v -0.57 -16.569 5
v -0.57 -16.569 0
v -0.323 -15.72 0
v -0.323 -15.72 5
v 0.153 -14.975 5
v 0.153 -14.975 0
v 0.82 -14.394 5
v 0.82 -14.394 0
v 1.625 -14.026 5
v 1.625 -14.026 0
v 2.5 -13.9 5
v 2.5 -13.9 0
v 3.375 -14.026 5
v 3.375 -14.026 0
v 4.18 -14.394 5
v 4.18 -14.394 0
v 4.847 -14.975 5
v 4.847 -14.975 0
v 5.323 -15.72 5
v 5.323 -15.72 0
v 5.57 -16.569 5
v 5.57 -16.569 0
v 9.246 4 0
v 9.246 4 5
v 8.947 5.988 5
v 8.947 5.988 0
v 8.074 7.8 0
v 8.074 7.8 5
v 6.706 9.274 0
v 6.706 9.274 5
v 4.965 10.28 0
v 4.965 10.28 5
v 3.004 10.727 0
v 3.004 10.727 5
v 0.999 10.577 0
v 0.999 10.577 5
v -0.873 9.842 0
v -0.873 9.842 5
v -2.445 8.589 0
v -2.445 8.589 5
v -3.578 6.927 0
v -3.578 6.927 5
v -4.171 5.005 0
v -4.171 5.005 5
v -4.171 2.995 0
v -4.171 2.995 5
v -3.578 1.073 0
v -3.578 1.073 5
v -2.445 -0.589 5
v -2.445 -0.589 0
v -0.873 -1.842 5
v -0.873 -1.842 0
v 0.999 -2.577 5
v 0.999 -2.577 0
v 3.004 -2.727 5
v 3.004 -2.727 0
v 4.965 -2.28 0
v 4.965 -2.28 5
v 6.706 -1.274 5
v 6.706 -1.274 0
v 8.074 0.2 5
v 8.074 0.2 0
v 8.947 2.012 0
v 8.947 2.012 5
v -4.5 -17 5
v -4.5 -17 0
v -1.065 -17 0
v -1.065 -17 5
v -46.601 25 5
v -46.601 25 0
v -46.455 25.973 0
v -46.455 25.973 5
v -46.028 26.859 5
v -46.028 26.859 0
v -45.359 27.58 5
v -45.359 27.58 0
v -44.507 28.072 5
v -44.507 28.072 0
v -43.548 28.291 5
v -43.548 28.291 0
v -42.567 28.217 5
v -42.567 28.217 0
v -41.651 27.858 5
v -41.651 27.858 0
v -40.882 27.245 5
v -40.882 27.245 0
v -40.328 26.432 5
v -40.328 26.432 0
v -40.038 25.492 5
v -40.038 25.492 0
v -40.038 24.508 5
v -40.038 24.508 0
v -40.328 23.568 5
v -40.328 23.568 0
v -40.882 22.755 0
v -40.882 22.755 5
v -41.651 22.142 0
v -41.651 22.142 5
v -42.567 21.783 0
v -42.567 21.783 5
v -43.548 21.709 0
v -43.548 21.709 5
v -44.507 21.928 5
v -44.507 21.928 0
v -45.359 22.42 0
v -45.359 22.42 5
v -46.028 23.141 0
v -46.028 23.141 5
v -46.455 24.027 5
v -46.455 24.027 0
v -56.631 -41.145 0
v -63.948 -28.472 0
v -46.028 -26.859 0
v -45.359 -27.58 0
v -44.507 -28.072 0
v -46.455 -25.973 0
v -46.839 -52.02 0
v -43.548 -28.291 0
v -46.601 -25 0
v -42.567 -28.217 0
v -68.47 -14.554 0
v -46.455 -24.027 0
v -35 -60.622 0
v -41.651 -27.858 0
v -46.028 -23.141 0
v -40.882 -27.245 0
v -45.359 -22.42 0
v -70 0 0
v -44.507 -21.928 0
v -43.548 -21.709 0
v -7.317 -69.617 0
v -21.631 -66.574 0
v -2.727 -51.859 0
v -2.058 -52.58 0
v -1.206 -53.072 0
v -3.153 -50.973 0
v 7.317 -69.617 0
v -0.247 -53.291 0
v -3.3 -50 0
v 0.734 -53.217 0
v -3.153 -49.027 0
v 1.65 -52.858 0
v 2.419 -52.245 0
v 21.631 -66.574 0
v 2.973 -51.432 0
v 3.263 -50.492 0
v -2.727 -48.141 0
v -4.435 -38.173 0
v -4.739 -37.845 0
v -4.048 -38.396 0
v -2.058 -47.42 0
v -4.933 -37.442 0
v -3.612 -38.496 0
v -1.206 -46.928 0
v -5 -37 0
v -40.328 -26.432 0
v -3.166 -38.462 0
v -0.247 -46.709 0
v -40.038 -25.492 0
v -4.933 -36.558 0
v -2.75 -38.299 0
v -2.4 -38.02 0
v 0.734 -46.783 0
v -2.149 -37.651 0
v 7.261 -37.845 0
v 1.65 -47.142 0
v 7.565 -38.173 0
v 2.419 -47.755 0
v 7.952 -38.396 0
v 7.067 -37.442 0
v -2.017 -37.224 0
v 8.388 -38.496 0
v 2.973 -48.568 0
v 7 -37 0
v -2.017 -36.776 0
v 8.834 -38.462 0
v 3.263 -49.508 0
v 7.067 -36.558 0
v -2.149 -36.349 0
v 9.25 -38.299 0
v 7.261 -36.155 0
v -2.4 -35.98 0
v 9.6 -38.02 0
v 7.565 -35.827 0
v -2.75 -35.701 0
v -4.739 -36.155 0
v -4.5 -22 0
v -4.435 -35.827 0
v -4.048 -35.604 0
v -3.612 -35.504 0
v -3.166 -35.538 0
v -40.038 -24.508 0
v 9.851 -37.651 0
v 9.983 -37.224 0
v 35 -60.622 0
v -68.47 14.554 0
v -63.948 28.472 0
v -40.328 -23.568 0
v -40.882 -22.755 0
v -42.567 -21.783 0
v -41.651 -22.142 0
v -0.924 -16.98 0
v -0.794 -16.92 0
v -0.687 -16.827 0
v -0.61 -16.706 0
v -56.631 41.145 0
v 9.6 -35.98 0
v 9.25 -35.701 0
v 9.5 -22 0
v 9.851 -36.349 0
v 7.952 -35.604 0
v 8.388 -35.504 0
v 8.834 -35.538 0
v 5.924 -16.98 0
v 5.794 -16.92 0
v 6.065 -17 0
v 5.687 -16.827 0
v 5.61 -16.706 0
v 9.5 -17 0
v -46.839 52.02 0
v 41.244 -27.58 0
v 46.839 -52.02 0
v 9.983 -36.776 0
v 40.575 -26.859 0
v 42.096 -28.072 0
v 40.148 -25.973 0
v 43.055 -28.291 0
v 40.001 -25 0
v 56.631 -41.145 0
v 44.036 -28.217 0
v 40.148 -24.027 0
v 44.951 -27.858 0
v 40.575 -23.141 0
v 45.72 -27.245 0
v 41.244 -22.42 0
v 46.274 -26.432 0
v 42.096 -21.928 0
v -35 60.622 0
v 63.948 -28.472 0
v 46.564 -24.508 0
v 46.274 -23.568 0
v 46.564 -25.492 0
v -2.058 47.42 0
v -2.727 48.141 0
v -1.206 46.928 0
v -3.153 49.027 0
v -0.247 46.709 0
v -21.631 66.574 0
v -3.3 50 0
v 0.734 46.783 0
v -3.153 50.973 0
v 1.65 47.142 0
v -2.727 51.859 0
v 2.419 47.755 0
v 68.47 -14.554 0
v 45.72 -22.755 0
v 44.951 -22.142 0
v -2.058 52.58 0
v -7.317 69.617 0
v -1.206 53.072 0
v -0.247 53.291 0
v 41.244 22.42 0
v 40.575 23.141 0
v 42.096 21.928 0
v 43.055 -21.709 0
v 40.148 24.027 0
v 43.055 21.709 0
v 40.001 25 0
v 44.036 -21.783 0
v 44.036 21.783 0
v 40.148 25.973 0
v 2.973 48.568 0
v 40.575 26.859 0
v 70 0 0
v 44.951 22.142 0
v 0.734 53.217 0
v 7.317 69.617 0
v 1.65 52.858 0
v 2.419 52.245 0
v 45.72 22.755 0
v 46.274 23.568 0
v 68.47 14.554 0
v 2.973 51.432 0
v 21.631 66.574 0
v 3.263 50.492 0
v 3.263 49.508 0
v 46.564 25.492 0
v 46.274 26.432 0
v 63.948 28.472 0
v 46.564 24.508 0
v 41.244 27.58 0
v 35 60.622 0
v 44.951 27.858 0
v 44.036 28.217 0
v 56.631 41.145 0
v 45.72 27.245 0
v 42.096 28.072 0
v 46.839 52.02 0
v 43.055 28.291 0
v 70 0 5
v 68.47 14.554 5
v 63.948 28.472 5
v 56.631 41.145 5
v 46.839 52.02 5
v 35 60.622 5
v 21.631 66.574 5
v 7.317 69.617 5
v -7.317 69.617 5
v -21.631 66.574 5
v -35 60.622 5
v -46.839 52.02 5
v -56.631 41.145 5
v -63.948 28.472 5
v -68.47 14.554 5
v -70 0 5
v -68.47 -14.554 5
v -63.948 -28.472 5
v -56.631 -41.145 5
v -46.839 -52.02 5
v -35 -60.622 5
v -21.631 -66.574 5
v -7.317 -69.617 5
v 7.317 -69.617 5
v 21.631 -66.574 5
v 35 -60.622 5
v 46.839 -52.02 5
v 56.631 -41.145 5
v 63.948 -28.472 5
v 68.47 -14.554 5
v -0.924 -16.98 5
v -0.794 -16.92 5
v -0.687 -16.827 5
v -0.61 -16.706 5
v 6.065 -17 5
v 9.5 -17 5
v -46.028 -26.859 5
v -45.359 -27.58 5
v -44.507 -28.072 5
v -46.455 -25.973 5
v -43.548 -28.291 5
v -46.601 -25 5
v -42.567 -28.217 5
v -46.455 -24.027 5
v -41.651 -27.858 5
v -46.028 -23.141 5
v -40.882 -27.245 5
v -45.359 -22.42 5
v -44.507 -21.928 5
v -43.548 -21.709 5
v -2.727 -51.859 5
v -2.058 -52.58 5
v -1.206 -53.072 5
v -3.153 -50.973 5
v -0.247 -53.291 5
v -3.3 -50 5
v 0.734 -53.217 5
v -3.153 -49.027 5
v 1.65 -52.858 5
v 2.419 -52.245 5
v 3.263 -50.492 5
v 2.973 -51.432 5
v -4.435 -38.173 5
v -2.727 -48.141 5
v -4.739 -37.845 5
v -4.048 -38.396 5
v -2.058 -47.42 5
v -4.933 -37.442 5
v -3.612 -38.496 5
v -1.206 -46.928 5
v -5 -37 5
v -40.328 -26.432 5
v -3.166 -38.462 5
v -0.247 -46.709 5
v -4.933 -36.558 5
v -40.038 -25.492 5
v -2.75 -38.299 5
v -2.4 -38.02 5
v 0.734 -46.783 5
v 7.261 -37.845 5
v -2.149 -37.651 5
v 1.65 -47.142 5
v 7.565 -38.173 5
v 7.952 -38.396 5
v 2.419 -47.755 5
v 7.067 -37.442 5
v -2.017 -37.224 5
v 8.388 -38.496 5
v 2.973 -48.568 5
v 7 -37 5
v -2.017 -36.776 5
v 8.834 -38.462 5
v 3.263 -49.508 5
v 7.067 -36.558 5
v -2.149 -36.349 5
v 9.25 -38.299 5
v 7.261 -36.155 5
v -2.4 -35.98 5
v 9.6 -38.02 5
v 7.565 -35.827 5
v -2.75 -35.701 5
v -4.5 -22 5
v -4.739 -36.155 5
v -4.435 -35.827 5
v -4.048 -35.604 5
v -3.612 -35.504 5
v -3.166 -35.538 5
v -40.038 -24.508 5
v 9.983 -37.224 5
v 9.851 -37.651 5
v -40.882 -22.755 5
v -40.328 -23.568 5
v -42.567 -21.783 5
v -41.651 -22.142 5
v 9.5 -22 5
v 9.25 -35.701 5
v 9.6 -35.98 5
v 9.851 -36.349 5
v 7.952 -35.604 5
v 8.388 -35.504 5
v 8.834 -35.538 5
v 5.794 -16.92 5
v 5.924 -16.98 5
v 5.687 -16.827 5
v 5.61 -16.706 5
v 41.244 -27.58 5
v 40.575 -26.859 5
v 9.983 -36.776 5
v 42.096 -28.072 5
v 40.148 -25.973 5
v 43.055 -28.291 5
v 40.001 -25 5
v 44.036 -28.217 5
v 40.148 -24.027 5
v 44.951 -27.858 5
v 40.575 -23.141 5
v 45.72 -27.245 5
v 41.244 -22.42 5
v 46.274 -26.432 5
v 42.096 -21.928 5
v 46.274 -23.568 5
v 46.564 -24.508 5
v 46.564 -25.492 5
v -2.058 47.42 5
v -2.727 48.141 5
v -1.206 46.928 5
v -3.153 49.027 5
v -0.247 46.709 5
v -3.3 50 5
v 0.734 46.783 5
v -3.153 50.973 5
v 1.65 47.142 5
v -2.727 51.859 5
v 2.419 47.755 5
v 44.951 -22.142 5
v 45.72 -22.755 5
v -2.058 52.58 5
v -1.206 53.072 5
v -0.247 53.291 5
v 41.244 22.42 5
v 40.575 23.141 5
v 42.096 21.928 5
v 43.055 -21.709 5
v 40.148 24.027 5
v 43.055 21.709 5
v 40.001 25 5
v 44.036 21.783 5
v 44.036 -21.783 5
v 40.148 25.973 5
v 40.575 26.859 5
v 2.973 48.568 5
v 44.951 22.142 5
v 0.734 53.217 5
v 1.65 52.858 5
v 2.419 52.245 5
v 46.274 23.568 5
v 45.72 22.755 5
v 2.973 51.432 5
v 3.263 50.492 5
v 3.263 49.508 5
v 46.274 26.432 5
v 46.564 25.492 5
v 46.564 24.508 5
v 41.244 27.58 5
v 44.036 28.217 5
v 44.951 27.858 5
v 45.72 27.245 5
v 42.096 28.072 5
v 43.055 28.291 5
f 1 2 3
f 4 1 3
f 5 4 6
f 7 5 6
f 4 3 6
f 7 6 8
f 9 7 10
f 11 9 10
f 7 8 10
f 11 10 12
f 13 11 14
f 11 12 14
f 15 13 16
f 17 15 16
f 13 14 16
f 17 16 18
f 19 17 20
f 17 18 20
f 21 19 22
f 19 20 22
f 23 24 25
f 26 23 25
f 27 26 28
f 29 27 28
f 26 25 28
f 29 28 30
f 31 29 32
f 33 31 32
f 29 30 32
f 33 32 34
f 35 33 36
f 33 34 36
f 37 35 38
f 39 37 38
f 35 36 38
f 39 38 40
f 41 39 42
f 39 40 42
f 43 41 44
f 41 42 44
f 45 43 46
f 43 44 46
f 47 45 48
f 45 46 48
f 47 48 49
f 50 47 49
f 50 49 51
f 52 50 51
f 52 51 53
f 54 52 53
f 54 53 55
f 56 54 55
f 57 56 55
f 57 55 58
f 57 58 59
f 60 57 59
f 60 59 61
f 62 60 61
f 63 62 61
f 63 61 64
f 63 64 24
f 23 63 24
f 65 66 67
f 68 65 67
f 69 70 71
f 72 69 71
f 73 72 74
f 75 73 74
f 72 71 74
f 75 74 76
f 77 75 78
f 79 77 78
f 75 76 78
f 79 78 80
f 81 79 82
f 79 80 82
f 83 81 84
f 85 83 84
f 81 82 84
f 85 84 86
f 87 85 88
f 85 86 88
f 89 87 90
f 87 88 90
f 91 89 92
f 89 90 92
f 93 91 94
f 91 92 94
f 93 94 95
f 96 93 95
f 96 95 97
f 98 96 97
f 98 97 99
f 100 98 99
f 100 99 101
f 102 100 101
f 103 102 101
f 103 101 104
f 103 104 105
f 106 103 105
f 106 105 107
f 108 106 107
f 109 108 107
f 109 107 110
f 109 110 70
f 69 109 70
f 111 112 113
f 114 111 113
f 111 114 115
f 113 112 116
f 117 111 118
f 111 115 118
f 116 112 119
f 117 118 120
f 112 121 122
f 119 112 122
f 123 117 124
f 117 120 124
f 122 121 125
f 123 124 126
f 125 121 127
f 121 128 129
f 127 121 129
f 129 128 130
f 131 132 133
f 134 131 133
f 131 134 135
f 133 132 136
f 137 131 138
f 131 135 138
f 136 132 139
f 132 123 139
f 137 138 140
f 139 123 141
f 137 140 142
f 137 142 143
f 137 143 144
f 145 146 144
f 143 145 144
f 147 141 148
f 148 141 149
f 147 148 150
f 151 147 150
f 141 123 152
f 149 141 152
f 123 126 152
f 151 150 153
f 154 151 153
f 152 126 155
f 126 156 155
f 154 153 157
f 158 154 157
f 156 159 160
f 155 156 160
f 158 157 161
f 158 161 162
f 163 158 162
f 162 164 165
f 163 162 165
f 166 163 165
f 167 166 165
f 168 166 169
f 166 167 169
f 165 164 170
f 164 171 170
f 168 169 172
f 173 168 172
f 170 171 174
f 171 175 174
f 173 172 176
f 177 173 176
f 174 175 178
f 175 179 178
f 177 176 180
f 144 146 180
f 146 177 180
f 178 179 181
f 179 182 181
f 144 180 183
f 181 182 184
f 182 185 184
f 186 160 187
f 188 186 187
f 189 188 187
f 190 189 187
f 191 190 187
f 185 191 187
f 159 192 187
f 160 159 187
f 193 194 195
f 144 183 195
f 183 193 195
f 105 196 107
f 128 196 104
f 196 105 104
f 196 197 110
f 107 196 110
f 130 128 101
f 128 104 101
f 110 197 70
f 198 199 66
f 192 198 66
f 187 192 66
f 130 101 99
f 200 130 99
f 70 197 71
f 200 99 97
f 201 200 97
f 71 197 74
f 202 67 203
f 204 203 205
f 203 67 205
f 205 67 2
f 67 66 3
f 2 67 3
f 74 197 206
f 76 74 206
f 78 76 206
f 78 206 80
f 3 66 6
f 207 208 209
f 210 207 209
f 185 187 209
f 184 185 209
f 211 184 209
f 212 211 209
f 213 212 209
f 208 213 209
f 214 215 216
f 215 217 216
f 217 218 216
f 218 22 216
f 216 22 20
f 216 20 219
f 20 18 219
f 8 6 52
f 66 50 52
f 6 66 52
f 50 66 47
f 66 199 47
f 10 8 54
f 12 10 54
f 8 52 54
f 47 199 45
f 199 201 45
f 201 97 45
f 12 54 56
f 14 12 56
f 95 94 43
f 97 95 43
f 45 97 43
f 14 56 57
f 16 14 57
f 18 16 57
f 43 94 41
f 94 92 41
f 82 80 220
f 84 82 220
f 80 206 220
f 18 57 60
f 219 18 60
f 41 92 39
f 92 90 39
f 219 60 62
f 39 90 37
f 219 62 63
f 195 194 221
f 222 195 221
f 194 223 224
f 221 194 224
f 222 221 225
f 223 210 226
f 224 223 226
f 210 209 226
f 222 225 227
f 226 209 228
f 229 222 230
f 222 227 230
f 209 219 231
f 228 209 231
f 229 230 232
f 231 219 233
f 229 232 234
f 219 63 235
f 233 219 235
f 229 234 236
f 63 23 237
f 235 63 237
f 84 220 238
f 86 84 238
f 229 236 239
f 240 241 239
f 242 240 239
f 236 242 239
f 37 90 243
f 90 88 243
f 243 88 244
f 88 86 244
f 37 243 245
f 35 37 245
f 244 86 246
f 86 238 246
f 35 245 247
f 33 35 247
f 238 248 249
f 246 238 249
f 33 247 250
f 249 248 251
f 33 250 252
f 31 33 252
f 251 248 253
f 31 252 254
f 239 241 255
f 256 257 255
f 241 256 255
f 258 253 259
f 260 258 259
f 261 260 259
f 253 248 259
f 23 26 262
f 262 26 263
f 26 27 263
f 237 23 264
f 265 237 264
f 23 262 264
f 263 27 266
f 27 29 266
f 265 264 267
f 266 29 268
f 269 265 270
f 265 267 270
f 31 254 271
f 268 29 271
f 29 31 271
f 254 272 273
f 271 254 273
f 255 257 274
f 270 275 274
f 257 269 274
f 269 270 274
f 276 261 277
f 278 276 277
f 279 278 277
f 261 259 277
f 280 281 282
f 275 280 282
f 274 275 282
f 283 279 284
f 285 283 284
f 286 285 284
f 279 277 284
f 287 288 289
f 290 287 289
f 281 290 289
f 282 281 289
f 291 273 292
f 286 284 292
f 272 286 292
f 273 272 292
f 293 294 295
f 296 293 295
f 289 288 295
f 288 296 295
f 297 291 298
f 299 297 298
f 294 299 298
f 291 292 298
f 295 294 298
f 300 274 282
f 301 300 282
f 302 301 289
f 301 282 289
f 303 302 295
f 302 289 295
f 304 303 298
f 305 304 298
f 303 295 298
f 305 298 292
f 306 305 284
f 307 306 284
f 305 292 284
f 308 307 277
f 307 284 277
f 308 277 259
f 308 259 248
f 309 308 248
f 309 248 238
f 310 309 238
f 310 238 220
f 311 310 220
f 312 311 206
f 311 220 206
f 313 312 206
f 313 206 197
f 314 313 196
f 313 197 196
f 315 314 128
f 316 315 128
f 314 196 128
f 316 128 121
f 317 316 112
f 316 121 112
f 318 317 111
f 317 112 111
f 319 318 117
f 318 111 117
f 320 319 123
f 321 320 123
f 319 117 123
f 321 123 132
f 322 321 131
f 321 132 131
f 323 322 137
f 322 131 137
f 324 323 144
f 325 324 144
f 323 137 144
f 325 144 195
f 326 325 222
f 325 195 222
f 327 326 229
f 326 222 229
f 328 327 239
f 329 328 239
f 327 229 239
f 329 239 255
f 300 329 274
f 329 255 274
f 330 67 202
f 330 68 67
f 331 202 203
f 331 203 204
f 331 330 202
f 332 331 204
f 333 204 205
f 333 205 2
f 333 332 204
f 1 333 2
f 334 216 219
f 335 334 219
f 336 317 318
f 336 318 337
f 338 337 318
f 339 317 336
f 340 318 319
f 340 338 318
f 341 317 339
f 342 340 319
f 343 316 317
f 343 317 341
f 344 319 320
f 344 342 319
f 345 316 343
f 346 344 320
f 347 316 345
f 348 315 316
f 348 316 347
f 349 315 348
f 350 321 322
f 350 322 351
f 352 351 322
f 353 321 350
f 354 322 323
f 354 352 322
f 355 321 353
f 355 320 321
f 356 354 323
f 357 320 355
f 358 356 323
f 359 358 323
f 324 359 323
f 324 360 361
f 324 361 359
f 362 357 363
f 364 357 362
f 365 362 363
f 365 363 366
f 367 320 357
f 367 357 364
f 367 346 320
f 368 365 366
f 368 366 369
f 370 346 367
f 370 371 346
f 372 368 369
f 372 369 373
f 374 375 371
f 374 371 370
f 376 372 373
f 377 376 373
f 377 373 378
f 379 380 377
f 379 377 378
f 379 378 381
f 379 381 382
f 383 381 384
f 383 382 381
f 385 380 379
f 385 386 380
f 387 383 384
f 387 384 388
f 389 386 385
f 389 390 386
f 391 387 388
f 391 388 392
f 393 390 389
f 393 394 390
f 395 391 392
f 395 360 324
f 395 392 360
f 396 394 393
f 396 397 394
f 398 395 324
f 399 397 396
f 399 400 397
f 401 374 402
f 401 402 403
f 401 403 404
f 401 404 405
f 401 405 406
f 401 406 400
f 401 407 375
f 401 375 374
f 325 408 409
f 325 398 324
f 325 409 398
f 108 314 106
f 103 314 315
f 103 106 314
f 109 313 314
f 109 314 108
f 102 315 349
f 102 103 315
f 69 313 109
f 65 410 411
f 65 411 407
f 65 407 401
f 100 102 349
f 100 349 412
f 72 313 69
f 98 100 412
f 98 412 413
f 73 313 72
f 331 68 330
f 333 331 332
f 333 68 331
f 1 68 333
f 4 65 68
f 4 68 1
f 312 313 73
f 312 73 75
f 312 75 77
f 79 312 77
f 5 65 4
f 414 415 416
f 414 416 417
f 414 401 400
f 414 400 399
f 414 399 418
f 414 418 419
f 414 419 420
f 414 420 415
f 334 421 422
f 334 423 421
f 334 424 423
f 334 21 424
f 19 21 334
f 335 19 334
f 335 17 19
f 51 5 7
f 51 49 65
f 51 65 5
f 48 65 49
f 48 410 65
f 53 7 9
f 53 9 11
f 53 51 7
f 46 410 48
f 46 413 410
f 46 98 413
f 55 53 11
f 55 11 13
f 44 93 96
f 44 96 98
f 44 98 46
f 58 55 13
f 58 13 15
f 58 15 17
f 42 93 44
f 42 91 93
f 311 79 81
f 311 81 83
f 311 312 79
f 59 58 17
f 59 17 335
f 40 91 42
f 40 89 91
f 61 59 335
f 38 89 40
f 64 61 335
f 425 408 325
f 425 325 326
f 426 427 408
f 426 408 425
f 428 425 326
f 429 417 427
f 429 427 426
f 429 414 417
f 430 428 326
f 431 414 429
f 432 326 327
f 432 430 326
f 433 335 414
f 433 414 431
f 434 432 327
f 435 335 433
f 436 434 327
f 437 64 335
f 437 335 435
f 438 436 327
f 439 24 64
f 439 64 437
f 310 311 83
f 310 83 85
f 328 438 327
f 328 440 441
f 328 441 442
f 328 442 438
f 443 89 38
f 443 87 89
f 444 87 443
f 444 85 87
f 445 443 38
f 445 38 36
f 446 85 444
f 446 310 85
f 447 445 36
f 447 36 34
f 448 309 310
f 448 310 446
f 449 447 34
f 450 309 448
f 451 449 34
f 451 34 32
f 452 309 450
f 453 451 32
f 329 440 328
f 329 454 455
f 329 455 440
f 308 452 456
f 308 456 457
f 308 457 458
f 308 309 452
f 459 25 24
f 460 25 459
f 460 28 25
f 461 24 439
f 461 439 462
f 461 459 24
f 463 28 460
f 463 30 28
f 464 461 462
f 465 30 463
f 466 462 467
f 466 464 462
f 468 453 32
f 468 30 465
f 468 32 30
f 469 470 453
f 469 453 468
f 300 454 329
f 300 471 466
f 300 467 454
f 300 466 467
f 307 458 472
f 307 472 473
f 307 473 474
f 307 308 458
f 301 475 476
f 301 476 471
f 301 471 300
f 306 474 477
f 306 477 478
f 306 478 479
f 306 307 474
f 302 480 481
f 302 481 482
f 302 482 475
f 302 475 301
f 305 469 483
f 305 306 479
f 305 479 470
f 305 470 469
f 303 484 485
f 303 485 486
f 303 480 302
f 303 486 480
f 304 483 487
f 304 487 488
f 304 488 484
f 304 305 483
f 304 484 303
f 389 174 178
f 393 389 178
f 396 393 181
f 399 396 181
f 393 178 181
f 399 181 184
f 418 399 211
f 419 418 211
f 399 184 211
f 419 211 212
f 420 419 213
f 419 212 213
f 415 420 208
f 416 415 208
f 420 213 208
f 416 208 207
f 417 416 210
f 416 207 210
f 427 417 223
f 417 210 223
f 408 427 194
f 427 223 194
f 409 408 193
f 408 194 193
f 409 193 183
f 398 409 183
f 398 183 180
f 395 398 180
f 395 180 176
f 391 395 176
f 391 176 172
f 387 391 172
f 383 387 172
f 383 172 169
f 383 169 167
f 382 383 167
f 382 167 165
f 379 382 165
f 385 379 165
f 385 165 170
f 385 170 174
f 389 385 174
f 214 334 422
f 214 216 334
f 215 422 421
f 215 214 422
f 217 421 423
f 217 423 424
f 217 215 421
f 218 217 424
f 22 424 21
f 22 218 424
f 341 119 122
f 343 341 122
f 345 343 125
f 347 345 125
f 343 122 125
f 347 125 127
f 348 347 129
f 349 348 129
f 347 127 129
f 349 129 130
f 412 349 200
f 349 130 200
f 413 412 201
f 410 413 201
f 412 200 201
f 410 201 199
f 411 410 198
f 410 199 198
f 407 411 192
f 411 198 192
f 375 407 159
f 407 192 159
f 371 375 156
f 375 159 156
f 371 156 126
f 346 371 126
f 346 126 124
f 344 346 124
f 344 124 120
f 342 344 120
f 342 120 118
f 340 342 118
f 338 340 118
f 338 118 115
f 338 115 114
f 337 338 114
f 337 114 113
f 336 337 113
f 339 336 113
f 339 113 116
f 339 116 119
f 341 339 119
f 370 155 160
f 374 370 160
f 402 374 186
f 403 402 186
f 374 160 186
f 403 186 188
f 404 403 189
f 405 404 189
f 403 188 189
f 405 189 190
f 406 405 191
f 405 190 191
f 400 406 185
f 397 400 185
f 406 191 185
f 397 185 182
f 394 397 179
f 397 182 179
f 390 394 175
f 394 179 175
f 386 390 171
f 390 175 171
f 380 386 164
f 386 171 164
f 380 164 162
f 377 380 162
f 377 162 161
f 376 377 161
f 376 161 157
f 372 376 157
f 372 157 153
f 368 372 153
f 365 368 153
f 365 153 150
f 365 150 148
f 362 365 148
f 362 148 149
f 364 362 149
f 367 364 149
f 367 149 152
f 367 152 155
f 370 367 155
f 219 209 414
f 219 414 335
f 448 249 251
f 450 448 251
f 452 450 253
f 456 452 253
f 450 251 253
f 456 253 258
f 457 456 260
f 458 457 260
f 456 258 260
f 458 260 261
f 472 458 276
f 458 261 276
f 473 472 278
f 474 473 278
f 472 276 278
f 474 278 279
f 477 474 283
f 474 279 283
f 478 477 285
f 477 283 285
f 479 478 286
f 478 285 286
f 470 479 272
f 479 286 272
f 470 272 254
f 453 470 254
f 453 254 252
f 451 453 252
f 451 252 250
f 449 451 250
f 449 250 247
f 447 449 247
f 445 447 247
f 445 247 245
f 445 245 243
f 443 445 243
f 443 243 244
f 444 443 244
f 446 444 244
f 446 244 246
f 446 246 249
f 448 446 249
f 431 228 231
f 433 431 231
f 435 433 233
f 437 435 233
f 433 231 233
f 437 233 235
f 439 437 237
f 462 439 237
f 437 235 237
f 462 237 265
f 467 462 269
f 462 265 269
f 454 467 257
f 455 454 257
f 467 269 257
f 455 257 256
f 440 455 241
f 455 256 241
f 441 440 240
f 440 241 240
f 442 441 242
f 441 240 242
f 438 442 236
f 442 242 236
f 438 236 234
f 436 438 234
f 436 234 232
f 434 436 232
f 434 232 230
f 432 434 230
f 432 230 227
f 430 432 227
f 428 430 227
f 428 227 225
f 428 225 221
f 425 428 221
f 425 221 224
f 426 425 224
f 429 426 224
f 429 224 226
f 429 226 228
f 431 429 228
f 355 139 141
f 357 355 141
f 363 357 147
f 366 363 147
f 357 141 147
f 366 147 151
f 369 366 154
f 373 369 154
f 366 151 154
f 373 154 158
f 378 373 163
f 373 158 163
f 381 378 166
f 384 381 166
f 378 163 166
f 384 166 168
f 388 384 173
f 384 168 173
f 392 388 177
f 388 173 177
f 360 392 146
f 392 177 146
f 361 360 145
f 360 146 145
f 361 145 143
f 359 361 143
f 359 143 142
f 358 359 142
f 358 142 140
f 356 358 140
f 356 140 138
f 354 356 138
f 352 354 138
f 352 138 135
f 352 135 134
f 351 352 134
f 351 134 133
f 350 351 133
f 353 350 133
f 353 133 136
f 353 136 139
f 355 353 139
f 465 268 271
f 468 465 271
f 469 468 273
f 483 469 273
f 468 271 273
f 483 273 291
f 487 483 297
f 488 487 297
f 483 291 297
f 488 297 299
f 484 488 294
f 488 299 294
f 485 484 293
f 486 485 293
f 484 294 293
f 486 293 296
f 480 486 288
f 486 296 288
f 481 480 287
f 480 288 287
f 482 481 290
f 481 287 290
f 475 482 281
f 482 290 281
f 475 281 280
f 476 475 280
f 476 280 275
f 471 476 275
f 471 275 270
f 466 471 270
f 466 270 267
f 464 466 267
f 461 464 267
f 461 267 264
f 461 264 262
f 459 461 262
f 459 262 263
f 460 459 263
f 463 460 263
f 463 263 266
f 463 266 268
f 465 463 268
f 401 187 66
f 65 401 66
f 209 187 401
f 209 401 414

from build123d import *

# Parameters (mm, degrees)
SKETCH1_R               = 70
BOSS_EXTRUDE1_DEPTH     = 5
SKETCH4_R               = 3
CUT_EXTRUDE2_DEPTH      = 100.121138008
CIRPATTERN1_COUNT       = 6
M6_CLEARANCE_HOLE1_D    = 6.6
SKETCH7_W               = 14
SKETCH7_H               = 5
CUT_EXTRUDE3_DEPTH      = 100.121138008
SKETCH8_R               = 1
SKETCH8_R_2             = 3.1
CUT_EXTRUDE4_DEPTH      = 100.121138008
F_1_2_CLEARANCE_HOLE1_D = 13.49248
FILLET1_R               = 0.5
SKETCH20_R              = 1.5
CUT_EXTRUDE6_DEPTH      = 100.121138008


with BuildPart() as part:
    # Sketch1 → Boss-Extrude1 (new body)
    with BuildSketch(Plane.XY):
        Circle(SKETCH1_R)
    extrude(amount=BOSS_EXTRUDE1_DEPTH)

    # Sketch4 → Cut-Extrude2 (cut, through all)
    with BuildSketch(Plane.XY):
        with Locations((0, 50)):
            Circle(SKETCH4_R)
    cut_extrude2 = extrude(amount=CUT_EXTRUDE2_DEPTH, mode=Mode.SUBTRACT)

    # CirPattern1: Cut-Extrude2 ×6 about axis
    cirpattern1_axis = Axis((0, 0, 0), (0, 0, 1))
    for i in range(1, CIRPATTERN1_COUNT):
        add(cut_extrude2.rotate(cirpattern1_axis, i * 360 / CIRPATTERN1_COUNT), mode=Mode.SUBTRACT)

    # M6 Clearance Hole1 (through all)
    with Locations(Plane.XY.offset(5)):
        with Locations((0, 50), (43.301270189, 25), (43.301270189, -25), (0, -50), (-43.301270189, -25), (-43.301270189, 25)):
            Hole(M6_CLEARANCE_HOLE1_D / 2)

    # Sketch7 → Cut-Extrude3 (cut, through all)
    with BuildSketch(Plane.XY):
        with Locations((2.5, -19.5)):
            Rectangle(SKETCH7_W, SKETCH7_H)
    extrude(amount=CUT_EXTRUDE3_DEPTH, mode=Mode.SUBTRACT)

    # Sketch8 → Cut-Extrude4 (cut, through all)
    with BuildSketch(Plane(origin=(0, 0, 0), x_dir=(-1, 0, 0), z_dir=(0, 0, -1))):
        with Locations((-2.5, 4)):
            Circle(SKETCH8_R)
        with Locations((-2.5, -17)):
            Circle(SKETCH8_R_2)
    extrude(amount=-CUT_EXTRUDE4_DEPTH, mode=Mode.SUBTRACT)

    # 1/2 Clearance Hole1 (through all)
    with Locations(Plane(origin=(0, 0, 0), x_dir=(-1, 0, 0), z_dir=(0, 0, -1))):
        with Locations((-2.5, 4)):
            Hole(F_1_2_CLEARANCE_HOLE1_D / 2)

    # Fillet1
    fillet1_edges = [part.edges().sort_by_distance(p)[0] for p in [
        (5.6, -17, 2.5),
        (-0.6, -17, 2.5),
    ]]
    fillet(fillet1_edges, radius=FILLET1_R)

    # Sketch20 → Cut-Extrude6 (cut, through all)
    with BuildSketch(Plane(origin=(0, 0, 0), x_dir=(-1, 0, 0), z_dir=(0, 0, -1))):
        with Locations((-8.5, -37)):
            Circle(SKETCH20_R)
        with Locations((3.5, -37)):
            Circle(SKETCH20_R)
    extrude(amount=-CUT_EXTRUDE6_DEPTH, mode=Mode.SUBTRACT)


solid = part.part
